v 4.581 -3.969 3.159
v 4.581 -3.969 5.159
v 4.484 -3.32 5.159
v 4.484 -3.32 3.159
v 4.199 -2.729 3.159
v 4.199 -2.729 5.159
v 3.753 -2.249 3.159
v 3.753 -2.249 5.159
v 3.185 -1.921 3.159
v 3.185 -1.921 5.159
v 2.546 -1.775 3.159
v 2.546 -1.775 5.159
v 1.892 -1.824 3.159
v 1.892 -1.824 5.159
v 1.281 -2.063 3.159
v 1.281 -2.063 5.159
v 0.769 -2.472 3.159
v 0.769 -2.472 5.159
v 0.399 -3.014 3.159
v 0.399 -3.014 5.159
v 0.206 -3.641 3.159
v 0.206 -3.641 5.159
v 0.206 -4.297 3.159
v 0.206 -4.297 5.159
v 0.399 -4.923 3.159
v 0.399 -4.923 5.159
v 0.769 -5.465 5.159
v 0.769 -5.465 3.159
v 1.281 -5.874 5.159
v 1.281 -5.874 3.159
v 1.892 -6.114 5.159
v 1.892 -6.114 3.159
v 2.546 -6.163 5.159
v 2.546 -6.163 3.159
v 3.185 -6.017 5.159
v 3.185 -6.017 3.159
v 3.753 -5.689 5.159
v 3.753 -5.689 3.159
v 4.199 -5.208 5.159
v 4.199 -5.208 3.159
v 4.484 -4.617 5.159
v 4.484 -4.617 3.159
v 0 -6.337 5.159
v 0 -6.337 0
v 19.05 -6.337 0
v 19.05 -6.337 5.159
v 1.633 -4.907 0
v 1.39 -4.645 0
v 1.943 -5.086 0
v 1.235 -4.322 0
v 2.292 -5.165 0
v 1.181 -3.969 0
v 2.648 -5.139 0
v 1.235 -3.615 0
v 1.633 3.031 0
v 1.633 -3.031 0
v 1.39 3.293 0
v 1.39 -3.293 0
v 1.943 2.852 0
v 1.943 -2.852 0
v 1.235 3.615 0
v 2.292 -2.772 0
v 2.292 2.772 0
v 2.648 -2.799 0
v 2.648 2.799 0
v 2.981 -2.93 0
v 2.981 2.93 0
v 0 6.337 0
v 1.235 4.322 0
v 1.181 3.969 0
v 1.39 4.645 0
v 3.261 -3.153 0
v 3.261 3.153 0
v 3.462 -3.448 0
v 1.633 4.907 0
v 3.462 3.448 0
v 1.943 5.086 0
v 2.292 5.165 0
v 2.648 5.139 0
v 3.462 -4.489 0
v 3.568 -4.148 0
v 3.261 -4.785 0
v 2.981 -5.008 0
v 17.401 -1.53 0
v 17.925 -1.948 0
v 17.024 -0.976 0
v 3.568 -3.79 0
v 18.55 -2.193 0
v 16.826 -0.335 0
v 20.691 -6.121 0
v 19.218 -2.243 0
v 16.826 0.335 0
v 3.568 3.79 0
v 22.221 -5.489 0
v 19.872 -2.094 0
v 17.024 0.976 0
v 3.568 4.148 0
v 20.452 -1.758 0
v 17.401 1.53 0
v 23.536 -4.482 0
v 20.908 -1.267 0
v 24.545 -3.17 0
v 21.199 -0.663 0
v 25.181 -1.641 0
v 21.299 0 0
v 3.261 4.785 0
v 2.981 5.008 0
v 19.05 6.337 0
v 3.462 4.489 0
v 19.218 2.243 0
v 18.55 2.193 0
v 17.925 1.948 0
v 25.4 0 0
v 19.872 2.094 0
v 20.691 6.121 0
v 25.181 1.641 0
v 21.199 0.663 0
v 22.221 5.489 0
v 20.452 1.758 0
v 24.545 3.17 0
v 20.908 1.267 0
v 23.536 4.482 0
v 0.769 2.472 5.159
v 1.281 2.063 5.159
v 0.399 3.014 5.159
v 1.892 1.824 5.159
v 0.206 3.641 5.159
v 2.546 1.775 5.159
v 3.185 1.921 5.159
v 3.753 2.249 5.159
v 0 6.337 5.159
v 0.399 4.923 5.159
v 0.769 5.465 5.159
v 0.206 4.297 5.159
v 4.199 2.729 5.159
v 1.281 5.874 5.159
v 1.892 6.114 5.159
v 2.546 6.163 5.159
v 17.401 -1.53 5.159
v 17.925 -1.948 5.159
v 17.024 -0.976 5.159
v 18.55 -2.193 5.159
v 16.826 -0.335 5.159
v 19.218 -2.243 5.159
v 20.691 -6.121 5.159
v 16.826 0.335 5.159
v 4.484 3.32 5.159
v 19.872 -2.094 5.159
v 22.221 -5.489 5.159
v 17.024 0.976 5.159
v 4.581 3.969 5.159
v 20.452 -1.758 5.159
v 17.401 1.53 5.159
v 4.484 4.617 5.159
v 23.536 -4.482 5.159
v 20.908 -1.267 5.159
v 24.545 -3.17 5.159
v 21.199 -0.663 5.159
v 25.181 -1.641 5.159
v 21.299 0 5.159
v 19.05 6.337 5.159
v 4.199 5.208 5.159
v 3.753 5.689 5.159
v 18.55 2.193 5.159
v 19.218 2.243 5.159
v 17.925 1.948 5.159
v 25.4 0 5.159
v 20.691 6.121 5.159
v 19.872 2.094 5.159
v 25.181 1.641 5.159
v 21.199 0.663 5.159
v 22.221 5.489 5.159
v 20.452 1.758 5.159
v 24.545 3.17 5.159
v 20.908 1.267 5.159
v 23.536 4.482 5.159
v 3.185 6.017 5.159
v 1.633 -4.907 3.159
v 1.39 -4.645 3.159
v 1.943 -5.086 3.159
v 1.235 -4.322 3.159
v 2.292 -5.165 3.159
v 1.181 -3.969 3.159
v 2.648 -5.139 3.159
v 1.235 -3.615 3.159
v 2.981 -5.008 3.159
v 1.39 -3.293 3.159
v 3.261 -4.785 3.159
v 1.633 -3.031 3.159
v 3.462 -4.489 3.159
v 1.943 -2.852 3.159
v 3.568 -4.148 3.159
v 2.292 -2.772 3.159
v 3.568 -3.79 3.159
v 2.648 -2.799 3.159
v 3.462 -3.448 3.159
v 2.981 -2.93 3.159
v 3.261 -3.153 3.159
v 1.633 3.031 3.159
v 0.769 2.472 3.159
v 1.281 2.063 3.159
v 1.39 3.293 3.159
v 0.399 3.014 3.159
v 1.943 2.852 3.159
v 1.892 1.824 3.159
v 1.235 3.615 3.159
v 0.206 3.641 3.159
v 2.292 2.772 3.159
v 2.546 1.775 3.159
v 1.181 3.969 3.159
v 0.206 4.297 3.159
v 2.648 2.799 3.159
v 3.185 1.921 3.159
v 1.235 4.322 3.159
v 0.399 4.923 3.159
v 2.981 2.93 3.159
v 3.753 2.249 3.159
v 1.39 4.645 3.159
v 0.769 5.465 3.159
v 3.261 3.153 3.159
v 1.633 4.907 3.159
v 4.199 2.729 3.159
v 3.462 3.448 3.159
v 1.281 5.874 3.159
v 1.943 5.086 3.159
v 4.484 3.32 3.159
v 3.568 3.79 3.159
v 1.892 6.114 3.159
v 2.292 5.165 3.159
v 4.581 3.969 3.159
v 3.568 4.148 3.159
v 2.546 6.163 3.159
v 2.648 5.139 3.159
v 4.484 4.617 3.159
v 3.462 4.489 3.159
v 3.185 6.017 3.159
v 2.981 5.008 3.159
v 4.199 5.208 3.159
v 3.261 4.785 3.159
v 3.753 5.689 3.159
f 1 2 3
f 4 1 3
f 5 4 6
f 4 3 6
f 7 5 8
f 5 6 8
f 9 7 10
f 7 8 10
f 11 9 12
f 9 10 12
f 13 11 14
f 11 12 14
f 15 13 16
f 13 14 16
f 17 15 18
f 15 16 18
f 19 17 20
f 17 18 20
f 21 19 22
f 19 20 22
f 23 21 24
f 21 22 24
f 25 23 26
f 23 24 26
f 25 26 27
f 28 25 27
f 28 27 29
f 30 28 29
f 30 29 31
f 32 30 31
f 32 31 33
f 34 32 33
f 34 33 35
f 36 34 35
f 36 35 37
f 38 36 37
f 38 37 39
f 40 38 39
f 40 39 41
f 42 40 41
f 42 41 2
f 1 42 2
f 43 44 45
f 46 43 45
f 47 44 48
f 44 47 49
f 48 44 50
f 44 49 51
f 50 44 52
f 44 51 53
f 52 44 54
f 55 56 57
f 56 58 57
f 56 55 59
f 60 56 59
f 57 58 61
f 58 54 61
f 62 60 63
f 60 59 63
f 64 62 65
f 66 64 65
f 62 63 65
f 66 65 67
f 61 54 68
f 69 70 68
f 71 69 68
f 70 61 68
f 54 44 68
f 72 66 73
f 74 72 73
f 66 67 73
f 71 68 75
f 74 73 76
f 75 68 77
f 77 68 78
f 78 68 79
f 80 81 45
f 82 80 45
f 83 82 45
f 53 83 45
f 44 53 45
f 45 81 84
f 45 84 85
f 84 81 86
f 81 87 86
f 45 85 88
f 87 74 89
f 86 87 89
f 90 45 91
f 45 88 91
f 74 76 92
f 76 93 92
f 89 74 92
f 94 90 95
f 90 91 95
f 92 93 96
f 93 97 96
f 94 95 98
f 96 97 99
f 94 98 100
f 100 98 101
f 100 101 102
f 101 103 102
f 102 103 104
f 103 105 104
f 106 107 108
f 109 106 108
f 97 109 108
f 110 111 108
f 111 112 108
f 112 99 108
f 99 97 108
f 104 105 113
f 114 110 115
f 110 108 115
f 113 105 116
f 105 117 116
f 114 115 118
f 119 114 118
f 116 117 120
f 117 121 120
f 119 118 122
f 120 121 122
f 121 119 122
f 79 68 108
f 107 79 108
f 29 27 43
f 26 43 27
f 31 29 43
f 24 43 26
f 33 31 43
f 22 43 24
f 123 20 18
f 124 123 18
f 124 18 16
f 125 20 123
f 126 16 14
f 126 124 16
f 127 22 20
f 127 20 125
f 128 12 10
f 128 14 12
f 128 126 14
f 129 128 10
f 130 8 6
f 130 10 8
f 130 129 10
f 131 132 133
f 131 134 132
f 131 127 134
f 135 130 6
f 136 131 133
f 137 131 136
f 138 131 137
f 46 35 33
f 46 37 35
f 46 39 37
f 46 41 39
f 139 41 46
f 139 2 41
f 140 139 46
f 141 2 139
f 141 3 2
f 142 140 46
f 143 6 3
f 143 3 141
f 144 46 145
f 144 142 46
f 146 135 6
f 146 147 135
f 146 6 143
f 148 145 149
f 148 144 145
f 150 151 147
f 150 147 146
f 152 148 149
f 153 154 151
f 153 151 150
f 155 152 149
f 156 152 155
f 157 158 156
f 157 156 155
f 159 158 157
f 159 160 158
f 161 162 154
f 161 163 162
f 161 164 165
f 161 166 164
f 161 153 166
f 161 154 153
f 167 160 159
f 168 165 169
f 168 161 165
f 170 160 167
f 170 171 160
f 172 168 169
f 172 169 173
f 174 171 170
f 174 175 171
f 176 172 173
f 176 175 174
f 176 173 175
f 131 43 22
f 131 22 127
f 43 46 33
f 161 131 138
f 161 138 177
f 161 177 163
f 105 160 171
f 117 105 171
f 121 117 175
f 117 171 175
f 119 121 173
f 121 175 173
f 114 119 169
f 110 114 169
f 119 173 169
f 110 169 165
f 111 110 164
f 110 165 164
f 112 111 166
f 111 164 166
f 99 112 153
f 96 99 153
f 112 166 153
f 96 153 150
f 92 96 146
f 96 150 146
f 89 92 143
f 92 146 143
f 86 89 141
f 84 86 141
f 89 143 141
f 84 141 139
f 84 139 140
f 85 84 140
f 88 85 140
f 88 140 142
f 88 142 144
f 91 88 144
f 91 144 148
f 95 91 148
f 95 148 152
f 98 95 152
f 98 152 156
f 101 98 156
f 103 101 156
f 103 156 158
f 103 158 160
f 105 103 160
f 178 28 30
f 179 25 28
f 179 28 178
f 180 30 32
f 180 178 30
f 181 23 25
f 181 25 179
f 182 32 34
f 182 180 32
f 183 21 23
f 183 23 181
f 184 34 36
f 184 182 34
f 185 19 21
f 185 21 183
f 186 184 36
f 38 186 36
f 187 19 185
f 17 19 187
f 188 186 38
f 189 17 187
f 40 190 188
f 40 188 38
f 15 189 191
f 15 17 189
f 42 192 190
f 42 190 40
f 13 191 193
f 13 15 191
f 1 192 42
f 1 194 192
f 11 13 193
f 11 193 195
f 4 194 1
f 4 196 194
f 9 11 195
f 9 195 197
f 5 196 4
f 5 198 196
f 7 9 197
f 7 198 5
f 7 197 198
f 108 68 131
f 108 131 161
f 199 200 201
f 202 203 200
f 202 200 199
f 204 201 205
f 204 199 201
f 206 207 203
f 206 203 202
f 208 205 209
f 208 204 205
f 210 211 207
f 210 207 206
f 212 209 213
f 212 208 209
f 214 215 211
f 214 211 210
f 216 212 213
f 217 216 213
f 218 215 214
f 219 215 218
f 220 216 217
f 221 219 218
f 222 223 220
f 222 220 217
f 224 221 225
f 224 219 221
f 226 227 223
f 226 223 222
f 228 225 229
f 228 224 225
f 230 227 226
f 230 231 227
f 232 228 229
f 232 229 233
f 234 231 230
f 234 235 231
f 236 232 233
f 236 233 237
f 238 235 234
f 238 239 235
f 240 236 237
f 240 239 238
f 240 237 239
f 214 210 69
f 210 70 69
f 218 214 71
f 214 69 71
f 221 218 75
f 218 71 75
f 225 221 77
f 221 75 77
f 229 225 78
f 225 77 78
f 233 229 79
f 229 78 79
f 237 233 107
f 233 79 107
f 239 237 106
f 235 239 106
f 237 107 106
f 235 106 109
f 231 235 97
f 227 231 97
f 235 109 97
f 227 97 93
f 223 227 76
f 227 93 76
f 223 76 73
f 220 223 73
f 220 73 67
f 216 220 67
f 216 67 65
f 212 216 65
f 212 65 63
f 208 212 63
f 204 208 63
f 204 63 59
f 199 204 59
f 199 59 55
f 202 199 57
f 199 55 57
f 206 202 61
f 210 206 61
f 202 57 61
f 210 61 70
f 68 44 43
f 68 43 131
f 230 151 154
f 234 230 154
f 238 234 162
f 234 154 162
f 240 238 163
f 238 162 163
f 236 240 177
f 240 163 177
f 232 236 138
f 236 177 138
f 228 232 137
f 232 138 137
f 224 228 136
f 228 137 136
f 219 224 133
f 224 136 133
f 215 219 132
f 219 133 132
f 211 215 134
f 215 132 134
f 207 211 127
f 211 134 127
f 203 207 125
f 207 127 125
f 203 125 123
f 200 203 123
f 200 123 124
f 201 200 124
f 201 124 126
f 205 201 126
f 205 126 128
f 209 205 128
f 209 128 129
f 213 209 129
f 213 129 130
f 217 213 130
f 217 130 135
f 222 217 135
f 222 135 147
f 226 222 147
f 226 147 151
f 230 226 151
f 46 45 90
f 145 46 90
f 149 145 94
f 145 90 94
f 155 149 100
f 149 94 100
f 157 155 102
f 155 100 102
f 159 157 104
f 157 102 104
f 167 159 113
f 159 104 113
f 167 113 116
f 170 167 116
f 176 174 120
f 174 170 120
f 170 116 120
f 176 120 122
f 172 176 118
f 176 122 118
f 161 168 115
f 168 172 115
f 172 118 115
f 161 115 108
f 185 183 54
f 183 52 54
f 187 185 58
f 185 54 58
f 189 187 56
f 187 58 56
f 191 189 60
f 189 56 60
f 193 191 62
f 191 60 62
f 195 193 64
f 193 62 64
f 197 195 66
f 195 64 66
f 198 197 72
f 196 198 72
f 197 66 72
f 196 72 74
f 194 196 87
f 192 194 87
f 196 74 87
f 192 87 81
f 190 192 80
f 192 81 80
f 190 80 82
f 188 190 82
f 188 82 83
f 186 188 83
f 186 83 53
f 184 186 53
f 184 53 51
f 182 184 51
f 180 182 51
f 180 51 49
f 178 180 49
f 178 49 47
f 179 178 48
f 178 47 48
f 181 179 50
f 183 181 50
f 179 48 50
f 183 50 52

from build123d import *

# Parameters (mm, degrees)
SKETCH1_W                      = 25.4
SKETCH1_H                      = 12.6746
BOSS_EXTRUDE1_DEPTH            = 5.159375
SKETCH2_R                      = 2.24917
CUT_EXTRUDE1_DEPTH             = 27.682213583
FILLET1_R                      = 6.35
CBORE_FOR_M2_SHCS1_D           = 2.4
CBORE_FOR_M2_SHCS1_CBORE_D     = 4.4
CBORE_FOR_M2_SHCS1_CBORE_DEPTH = 2


with BuildPart() as part:
    # Sketch1 → Boss-Extrude1 (new body)
    with BuildSketch(Plane.XY):
        with Locations((12.7, 0)):
            Rectangle(SKETCH1_W, SKETCH1_H)
    extrude(amount=BOSS_EXTRUDE1_DEPTH)

    # Sketch2 → Cut-Extrude1 (cut, through all)
    with BuildSketch(Plane.XY.offset(5.159375)):
        with Locations((19.05, 0)):
            Circle(SKETCH2_R)
    extrude(amount=-CUT_EXTRUDE1_DEPTH, mode=Mode.SUBTRACT)

    # Fillet1
    # the kernel refuses this fillet: 6.35 mm, written as the material it takes off along each edge
    with BuildSketch(Plane(origin=(25.4, -6.3373, -15.875), x_dir=(0, 1, 0), z_dir=(0, 0, 1)), Plane(origin=(25.4, 6.3373, -15.875), x_dir=(-1, 0, 0), z_dir=(0, 0, 1))) as fillet1_piece_1:
        with BuildLine():
            CenterArc((FILLET1_R, FILLET1_R), FILLET1_R, 180, 90)
            Line((0, FILLET1_R), (0, 0))
            Line((0, 0), (FILLET1_R, 0))
        make_face()
    extrude(amount=36.909375, mode=Mode.SUBTRACT)

    # CBORE for M2 SHCS1 (through all)
    with Locations(Plane.XY.offset(5.159375)):
        with Locations((2.38125, 3.96875), (2.38125, -3.96875)):
            CounterBoreHole(CBORE_FOR_M2_SHCS1_D / 2, CBORE_FOR_M2_SHCS1_CBORE_D / 2, CBORE_FOR_M2_SHCS1_CBORE_DEPTH)


solid = part.part
